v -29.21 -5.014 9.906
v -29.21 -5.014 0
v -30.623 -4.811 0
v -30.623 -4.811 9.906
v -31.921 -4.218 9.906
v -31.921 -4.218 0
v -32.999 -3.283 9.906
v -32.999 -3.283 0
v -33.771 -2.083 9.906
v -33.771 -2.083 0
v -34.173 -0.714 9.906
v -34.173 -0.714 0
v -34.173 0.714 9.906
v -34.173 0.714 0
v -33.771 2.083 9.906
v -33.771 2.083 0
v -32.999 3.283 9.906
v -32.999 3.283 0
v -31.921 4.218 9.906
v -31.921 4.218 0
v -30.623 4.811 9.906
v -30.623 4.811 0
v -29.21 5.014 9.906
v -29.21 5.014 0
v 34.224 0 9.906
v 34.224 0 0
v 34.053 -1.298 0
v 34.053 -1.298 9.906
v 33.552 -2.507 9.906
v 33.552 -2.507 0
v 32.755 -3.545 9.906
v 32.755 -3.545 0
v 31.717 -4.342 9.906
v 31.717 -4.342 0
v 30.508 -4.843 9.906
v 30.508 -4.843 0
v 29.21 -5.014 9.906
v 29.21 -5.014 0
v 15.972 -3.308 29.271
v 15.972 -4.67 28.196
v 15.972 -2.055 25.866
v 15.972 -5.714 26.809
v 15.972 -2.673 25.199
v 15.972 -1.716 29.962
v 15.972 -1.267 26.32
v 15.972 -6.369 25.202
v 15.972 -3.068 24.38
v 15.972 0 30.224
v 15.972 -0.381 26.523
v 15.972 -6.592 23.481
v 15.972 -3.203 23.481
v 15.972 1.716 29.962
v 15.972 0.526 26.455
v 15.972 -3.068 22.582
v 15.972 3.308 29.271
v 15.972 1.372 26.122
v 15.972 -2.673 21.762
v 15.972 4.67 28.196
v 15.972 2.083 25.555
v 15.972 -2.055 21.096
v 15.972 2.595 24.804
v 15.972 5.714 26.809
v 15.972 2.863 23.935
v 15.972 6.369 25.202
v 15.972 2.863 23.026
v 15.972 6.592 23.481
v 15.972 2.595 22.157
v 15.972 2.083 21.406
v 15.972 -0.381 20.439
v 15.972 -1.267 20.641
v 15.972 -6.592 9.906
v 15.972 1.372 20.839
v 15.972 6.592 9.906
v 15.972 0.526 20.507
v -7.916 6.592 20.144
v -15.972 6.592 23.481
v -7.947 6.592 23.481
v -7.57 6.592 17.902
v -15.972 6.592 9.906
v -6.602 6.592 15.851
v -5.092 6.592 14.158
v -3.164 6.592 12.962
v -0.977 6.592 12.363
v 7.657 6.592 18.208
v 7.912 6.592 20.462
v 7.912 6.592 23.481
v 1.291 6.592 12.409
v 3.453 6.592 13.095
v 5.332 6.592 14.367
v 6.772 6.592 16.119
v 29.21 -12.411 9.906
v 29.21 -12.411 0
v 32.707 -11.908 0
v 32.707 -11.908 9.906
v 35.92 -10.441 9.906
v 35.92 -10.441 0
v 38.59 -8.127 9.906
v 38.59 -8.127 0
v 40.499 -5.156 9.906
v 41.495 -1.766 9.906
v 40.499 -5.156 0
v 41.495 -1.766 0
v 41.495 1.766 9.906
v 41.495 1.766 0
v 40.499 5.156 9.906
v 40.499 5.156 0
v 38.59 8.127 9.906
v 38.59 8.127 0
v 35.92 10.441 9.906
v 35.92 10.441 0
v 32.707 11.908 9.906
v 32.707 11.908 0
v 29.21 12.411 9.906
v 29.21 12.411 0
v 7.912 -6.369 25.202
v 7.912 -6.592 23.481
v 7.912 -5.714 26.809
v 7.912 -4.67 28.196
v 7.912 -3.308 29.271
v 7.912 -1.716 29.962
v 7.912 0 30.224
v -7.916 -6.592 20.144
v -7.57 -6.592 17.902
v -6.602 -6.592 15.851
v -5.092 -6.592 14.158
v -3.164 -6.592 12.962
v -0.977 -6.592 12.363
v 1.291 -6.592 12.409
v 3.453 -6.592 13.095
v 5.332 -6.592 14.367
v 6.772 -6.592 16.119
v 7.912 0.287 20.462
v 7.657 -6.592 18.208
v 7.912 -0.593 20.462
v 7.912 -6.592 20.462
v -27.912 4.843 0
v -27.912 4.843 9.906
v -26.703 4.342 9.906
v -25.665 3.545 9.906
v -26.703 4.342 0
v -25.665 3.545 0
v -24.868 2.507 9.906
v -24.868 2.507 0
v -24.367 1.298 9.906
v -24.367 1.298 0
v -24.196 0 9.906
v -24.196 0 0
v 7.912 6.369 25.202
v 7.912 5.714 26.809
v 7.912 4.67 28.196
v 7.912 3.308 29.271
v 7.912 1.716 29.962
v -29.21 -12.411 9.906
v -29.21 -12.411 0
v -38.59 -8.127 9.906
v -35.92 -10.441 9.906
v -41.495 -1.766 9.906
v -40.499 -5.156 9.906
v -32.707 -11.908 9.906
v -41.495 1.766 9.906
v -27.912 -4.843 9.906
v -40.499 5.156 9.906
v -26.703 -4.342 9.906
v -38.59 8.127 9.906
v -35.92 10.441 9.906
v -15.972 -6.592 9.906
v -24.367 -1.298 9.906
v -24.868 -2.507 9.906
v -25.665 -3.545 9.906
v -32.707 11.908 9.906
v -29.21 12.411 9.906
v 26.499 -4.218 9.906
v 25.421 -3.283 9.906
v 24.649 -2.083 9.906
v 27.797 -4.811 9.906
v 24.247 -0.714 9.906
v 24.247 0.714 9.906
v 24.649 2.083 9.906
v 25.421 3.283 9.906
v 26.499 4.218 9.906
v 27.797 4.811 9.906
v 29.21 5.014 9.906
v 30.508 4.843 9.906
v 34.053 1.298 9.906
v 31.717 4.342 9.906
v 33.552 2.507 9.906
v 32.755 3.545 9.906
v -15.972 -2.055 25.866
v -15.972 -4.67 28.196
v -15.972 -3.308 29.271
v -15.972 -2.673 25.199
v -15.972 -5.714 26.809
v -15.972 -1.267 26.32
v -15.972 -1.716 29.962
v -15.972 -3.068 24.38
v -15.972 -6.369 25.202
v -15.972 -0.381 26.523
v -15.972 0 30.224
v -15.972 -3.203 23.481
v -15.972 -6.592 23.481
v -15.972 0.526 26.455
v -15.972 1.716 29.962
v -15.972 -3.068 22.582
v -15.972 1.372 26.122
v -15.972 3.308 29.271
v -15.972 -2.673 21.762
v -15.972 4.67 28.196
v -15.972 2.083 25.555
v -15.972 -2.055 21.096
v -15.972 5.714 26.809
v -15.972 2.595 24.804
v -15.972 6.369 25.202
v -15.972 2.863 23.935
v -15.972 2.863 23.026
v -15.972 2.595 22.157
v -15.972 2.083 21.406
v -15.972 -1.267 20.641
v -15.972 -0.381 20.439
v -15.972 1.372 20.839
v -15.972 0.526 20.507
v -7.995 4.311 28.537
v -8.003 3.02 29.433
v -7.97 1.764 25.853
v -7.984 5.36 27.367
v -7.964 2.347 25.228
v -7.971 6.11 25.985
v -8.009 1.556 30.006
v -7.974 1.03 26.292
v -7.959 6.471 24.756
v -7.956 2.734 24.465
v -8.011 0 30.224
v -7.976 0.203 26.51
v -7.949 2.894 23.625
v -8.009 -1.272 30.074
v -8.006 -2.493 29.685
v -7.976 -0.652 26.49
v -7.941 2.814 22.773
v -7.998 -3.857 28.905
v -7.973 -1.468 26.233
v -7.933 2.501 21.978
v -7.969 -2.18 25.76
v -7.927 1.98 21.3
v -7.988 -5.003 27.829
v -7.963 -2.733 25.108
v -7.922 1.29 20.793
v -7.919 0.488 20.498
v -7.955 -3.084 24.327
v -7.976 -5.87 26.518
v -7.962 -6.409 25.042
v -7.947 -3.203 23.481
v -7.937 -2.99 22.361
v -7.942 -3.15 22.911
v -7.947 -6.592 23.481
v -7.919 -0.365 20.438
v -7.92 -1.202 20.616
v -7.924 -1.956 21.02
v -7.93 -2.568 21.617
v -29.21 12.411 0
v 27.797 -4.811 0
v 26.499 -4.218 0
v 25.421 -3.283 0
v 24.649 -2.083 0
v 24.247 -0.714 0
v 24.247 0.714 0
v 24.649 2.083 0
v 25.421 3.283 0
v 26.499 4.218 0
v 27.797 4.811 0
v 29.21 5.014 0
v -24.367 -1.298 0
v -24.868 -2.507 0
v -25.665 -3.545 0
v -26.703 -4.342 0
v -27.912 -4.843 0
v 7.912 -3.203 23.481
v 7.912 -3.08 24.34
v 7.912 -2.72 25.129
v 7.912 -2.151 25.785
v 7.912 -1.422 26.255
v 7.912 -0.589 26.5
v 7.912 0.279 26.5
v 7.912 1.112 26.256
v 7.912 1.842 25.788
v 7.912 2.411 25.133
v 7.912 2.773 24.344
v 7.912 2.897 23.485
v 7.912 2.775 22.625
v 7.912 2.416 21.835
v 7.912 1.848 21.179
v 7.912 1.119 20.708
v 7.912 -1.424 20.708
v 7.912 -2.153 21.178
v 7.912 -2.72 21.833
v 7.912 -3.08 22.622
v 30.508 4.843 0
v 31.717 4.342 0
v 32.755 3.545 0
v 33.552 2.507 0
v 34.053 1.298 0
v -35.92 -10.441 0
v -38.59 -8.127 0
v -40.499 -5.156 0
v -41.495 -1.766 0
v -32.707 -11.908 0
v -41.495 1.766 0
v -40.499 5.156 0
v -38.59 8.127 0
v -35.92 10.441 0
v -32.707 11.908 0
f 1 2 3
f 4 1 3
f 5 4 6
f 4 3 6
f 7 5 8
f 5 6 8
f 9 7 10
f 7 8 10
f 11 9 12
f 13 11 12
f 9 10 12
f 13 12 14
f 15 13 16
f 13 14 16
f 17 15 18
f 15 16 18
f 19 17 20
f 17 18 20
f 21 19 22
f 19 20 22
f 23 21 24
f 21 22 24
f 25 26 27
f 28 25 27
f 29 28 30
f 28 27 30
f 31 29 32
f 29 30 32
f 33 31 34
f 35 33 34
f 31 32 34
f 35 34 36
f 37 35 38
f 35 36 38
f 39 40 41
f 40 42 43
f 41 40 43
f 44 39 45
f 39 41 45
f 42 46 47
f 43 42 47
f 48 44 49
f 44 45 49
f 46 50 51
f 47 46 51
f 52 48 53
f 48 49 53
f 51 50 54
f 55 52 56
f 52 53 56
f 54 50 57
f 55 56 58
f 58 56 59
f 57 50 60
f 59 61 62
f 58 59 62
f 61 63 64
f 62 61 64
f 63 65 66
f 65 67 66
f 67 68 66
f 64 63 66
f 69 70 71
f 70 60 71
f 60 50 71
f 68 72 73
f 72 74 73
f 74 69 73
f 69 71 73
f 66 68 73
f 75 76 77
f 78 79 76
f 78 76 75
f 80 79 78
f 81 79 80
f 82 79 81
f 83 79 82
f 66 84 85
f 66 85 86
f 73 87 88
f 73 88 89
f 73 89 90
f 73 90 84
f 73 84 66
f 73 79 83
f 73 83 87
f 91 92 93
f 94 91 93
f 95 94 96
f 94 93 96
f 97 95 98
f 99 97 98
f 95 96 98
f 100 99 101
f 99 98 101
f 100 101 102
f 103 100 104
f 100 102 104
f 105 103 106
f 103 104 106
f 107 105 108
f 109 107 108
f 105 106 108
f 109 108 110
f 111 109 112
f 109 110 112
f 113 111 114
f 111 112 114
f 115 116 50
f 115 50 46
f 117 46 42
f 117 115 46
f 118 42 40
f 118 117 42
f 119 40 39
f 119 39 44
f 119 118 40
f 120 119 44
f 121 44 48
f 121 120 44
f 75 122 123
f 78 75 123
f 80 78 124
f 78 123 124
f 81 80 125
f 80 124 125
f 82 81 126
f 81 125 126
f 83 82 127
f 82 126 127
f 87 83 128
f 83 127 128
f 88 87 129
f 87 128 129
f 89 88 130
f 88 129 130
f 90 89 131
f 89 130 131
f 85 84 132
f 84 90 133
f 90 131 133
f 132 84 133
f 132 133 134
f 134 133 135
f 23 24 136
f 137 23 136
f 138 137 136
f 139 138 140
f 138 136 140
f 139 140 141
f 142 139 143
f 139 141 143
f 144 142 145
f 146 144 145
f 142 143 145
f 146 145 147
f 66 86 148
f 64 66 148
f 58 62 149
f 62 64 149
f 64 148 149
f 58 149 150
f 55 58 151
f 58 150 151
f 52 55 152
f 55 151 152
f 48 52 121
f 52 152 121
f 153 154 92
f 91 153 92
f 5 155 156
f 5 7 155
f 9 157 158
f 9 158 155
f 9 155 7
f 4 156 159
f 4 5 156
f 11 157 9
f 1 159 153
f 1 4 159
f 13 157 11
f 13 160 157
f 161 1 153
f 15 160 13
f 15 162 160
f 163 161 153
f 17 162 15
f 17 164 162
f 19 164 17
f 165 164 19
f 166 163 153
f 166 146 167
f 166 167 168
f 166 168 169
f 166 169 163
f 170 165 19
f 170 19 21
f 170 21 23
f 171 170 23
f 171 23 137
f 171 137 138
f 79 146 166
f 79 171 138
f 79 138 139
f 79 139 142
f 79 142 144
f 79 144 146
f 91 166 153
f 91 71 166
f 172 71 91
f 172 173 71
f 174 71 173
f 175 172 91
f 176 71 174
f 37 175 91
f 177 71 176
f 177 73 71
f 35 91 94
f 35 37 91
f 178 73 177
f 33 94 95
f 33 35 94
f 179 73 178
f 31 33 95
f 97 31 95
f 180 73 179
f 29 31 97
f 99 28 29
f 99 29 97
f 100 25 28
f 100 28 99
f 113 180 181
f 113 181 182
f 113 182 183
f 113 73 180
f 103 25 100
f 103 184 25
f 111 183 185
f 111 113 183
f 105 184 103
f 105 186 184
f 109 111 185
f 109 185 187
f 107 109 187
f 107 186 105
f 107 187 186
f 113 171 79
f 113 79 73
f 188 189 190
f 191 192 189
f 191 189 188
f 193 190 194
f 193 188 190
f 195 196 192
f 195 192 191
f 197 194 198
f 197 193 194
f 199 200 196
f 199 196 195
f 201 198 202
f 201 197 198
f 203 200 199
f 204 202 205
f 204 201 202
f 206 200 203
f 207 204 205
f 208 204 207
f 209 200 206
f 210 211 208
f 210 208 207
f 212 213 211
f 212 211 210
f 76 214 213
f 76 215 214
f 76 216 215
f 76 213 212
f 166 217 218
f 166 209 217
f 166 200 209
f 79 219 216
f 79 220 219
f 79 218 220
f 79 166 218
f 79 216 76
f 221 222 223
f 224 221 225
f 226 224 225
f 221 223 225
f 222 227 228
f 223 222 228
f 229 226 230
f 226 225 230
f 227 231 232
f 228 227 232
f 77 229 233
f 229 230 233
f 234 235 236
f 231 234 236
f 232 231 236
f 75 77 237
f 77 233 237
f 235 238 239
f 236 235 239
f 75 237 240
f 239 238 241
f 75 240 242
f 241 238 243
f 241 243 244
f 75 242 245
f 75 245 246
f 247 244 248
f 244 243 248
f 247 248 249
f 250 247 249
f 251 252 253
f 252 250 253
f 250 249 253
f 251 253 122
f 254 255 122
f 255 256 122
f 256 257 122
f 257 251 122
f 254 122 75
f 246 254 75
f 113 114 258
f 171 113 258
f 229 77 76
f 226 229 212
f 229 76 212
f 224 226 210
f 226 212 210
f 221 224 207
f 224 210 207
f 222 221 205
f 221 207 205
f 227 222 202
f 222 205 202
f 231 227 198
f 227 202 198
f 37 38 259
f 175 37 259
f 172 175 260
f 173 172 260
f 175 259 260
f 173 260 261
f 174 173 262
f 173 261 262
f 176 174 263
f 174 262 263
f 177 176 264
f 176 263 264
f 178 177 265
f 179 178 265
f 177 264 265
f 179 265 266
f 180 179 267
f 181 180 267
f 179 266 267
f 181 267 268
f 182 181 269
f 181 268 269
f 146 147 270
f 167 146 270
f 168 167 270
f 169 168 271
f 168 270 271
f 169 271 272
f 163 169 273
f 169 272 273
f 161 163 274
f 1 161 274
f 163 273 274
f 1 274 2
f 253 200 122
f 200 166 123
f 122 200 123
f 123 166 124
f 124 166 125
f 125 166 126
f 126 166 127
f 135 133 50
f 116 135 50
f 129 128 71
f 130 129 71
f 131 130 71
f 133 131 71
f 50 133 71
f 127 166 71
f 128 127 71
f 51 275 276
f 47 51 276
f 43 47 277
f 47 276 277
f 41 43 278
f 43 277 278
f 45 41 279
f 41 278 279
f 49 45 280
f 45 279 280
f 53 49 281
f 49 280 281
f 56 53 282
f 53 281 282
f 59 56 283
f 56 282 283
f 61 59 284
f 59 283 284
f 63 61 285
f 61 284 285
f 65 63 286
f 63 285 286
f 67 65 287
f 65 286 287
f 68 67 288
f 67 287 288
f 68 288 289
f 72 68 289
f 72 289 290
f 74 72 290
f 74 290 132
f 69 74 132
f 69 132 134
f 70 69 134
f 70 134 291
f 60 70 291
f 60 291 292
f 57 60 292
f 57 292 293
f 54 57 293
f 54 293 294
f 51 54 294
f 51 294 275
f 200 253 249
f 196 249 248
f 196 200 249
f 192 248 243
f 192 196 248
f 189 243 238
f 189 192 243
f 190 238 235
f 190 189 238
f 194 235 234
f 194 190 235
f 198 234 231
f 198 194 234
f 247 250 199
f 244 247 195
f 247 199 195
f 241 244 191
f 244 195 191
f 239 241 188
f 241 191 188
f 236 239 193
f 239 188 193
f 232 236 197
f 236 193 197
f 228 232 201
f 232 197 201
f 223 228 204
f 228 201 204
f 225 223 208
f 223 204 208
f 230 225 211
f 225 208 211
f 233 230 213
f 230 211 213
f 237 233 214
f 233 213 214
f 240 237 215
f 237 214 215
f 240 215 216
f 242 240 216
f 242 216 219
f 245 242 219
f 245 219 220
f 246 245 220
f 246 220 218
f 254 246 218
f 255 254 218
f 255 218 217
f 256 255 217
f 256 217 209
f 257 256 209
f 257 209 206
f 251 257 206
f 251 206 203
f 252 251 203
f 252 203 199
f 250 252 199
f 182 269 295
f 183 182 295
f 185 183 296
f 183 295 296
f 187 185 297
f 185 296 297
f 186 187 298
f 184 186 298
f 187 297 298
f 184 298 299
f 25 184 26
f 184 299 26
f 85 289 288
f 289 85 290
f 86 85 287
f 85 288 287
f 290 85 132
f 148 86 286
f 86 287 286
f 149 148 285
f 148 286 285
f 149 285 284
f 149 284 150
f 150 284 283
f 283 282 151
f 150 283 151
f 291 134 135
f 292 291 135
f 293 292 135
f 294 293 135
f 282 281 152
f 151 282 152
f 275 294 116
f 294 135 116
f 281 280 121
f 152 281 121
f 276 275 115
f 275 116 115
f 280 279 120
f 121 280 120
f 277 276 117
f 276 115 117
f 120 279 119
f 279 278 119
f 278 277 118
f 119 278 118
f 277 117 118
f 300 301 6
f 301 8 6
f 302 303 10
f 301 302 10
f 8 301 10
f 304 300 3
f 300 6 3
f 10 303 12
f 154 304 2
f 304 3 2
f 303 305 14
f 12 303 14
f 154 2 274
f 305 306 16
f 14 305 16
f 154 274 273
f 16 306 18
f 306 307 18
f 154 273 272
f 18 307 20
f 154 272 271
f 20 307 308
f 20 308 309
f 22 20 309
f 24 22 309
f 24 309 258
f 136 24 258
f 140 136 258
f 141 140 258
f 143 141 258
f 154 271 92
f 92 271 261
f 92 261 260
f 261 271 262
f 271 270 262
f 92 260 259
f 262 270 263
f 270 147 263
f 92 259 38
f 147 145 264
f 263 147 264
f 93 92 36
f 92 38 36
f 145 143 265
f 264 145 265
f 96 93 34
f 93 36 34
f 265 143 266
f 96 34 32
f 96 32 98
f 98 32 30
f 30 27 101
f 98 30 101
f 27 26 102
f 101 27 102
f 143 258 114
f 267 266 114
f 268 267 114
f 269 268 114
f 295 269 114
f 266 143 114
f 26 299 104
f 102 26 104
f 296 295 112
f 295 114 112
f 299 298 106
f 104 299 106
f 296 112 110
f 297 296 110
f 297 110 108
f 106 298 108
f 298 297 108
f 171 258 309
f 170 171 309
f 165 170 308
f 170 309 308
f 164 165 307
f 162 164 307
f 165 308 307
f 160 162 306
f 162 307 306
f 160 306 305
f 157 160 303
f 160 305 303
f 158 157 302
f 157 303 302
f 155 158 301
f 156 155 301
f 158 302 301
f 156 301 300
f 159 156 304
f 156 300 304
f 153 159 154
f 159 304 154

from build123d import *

# Parameters (mm, degrees)
F1_DEPTH    = 9.906
F2_W        = 31.9448374212
F2_H        = 13.18457257
F3_DEPTH    = 20.32
F5_DEPTH    = 25.4
F6_T1_DEPTH = 41.6882551367
F6_T3_DEPTH = 41.7866267939
F7_R        = 3.0503938931
F8_DEPTH    = 57.5943291351


# Not quite as in the source:
# - a fillet or chamfer that OpenCascade refuses, or shapes differently, is made with other operations: its cross-section is extruded or revolved along the edge and cut away or added


with BuildPart() as f1:
    # F0 (on Top) → F1 (new body)
    with BuildSketch(Plane.XY):
        with BuildLine():
            Line((-29.21, -12.4109104246), (29.21, -12.4109104246))
            Line((29.21, -12.4109104246), (29.21, -5.0137877216))
            ThreePointArc((29.21, -5.0137877216), (24.1962122784, 0), (29.21, 5.0137877216))
            Line((29.21, 5.0137877216), (29.21, 12.4109104246))
            Line((29.21, 12.4109104246), (-29.21, 12.4109104246))
            Line((-29.21, 12.4109104246), (-29.21, 5.0137877216))
            ThreePointArc((-29.21, 5.0137877216), (-25.6647167027, 3.5452832973), (-24.1962122784, 0))
            ThreePointArc((-24.1962122784, 0), (-25.6647167027, -3.5452832973), (-29.21, -5.0137877216))
            Line((-29.21, -5.0137877216), (-29.21, -12.4109104246))
        make_face()
        with BuildLine():
            ThreePointArc((-29.21, 12.4109104246), (-41.6209104246, 0), (-29.21, -12.4109104246))
            Line((-29.21, -12.4109104246), (-29.21, -5.0137877216))
            ThreePointArc((-29.21, -5.0137877216), (-34.2237877216, 0), (-29.21, 5.0137877216))
            Line((-29.21, 5.0137877216), (-29.21, 12.4109104246))
        make_face()
        with BuildLine():
            Line((29.21, -5.0137877216), (29.21, -12.4109104246))
            ThreePointArc((29.21, -12.4109104246), (41.6209104246, 0), (29.21, 12.4109104246))
            Line((29.21, 12.4109104246), (29.21, 5.0137877216))
            ThreePointArc((29.21, 5.0137877216), (32.7552832973, 3.5452832973), (34.2237877216, 0))
            ThreePointArc((34.2237877216, 0), (32.7552832973, -3.5452832973), (29.21, -5.0137877216))
        make_face()
    extrude(amount=F1_DEPTH)

    # F2 (on face) → F3 (join)
    with BuildSketch(Plane.XY.offset(9.906)):
        Rectangle(F2_W, F2_H)
    extrude(amount=F3_DEPTH)

    # F4 (on face) → F5 (cut)
    with BuildSketch(Plane.XZ.offset(6.592286285)):
        with BuildLine():
            Line((-8.0107270402, 30.226), (-7.9157502647, 20.1440832174))
            ThreePointArc((-7.9157502647, 20.1440832174), (0.1590473721, 12.3041500236), (7.912355383, 20.462159845))
            Line((7.912355383, 20.462159845), (7.912355383, 30.226))
            Line((7.912355383, 30.226), (-8.0107270402, 30.226))
        make_face()
    extrude(amount=-F5_DEPTH, mode=Mode.SUBTRACT)

    # F6: fillet of radius 6.7453126933 on 4 edges, made by hand

    # F6_s2 → F6_t1 (cut)
    with BuildSketch(Plane.YZ.offset(-32.8357004438)):
        with BuildLine():
            ThreePointArc((-6.592286285, 23.4806873067), (-4.6166299384, 28.2503436534), (0.1530264083, 30.226))
            Line((0.1530264083, 30.226), (-6.592286285, 30.226))
            Line((-6.592286285, 30.226), (-6.592286285, 23.4806873067))
        make_face()
        with BuildLine():
            ThreePointArc((6.592286285, 23.4806873067), (4.6166299384, 28.2503436534), (-0.1530264083, 30.226))
            Line((-0.1530264083, 30.226), (6.592286285, 30.226))
            Line((6.592286285, 30.226), (6.592286285, 23.4806873067))
        make_face()
    extrude(amount=F6_T1_DEPTH, mode=Mode.SUBTRACT)

    # F6_s4 → F6_t3 (cut)
    with BuildSketch(Plane.YZ.offset(-8.9509263502)):
        with BuildLine():
            ThreePointArc((-6.592286285, 23.4806873067), (-4.6166299384, 28.2503436534), (0.1530264083, 30.226))
            Line((0.1530264083, 30.226), (-6.592286285, 30.226))
            Line((-6.592286285, 30.226), (-6.592286285, 23.4806873067))
        make_face()
        with BuildLine():
            ThreePointArc((6.592286285, 23.4806873067), (4.6166299384, 28.2503436534), (-0.1530264083, 30.226))
            Line((-0.1530264083, 30.226), (6.592286285, 30.226))
            Line((6.592286285, 30.226), (6.592286285, 23.4806873067))
        make_face()
    extrude(amount=F6_T3_DEPTH, mode=Mode.SUBTRACT)

    # F7 (on face) → F8 (cut, through all)
    with BuildSketch(Plane(origin=(-15.9724187106, 0, 0), x_dir=(0, -1, 0), z_dir=(-1, 0, 0))):
        with Locations((0.1530264083, 23.4806873067)):
            Circle(F7_R)
    extrude(amount=-F8_DEPTH, mode=Mode.SUBTRACT)


solid = f1.part
